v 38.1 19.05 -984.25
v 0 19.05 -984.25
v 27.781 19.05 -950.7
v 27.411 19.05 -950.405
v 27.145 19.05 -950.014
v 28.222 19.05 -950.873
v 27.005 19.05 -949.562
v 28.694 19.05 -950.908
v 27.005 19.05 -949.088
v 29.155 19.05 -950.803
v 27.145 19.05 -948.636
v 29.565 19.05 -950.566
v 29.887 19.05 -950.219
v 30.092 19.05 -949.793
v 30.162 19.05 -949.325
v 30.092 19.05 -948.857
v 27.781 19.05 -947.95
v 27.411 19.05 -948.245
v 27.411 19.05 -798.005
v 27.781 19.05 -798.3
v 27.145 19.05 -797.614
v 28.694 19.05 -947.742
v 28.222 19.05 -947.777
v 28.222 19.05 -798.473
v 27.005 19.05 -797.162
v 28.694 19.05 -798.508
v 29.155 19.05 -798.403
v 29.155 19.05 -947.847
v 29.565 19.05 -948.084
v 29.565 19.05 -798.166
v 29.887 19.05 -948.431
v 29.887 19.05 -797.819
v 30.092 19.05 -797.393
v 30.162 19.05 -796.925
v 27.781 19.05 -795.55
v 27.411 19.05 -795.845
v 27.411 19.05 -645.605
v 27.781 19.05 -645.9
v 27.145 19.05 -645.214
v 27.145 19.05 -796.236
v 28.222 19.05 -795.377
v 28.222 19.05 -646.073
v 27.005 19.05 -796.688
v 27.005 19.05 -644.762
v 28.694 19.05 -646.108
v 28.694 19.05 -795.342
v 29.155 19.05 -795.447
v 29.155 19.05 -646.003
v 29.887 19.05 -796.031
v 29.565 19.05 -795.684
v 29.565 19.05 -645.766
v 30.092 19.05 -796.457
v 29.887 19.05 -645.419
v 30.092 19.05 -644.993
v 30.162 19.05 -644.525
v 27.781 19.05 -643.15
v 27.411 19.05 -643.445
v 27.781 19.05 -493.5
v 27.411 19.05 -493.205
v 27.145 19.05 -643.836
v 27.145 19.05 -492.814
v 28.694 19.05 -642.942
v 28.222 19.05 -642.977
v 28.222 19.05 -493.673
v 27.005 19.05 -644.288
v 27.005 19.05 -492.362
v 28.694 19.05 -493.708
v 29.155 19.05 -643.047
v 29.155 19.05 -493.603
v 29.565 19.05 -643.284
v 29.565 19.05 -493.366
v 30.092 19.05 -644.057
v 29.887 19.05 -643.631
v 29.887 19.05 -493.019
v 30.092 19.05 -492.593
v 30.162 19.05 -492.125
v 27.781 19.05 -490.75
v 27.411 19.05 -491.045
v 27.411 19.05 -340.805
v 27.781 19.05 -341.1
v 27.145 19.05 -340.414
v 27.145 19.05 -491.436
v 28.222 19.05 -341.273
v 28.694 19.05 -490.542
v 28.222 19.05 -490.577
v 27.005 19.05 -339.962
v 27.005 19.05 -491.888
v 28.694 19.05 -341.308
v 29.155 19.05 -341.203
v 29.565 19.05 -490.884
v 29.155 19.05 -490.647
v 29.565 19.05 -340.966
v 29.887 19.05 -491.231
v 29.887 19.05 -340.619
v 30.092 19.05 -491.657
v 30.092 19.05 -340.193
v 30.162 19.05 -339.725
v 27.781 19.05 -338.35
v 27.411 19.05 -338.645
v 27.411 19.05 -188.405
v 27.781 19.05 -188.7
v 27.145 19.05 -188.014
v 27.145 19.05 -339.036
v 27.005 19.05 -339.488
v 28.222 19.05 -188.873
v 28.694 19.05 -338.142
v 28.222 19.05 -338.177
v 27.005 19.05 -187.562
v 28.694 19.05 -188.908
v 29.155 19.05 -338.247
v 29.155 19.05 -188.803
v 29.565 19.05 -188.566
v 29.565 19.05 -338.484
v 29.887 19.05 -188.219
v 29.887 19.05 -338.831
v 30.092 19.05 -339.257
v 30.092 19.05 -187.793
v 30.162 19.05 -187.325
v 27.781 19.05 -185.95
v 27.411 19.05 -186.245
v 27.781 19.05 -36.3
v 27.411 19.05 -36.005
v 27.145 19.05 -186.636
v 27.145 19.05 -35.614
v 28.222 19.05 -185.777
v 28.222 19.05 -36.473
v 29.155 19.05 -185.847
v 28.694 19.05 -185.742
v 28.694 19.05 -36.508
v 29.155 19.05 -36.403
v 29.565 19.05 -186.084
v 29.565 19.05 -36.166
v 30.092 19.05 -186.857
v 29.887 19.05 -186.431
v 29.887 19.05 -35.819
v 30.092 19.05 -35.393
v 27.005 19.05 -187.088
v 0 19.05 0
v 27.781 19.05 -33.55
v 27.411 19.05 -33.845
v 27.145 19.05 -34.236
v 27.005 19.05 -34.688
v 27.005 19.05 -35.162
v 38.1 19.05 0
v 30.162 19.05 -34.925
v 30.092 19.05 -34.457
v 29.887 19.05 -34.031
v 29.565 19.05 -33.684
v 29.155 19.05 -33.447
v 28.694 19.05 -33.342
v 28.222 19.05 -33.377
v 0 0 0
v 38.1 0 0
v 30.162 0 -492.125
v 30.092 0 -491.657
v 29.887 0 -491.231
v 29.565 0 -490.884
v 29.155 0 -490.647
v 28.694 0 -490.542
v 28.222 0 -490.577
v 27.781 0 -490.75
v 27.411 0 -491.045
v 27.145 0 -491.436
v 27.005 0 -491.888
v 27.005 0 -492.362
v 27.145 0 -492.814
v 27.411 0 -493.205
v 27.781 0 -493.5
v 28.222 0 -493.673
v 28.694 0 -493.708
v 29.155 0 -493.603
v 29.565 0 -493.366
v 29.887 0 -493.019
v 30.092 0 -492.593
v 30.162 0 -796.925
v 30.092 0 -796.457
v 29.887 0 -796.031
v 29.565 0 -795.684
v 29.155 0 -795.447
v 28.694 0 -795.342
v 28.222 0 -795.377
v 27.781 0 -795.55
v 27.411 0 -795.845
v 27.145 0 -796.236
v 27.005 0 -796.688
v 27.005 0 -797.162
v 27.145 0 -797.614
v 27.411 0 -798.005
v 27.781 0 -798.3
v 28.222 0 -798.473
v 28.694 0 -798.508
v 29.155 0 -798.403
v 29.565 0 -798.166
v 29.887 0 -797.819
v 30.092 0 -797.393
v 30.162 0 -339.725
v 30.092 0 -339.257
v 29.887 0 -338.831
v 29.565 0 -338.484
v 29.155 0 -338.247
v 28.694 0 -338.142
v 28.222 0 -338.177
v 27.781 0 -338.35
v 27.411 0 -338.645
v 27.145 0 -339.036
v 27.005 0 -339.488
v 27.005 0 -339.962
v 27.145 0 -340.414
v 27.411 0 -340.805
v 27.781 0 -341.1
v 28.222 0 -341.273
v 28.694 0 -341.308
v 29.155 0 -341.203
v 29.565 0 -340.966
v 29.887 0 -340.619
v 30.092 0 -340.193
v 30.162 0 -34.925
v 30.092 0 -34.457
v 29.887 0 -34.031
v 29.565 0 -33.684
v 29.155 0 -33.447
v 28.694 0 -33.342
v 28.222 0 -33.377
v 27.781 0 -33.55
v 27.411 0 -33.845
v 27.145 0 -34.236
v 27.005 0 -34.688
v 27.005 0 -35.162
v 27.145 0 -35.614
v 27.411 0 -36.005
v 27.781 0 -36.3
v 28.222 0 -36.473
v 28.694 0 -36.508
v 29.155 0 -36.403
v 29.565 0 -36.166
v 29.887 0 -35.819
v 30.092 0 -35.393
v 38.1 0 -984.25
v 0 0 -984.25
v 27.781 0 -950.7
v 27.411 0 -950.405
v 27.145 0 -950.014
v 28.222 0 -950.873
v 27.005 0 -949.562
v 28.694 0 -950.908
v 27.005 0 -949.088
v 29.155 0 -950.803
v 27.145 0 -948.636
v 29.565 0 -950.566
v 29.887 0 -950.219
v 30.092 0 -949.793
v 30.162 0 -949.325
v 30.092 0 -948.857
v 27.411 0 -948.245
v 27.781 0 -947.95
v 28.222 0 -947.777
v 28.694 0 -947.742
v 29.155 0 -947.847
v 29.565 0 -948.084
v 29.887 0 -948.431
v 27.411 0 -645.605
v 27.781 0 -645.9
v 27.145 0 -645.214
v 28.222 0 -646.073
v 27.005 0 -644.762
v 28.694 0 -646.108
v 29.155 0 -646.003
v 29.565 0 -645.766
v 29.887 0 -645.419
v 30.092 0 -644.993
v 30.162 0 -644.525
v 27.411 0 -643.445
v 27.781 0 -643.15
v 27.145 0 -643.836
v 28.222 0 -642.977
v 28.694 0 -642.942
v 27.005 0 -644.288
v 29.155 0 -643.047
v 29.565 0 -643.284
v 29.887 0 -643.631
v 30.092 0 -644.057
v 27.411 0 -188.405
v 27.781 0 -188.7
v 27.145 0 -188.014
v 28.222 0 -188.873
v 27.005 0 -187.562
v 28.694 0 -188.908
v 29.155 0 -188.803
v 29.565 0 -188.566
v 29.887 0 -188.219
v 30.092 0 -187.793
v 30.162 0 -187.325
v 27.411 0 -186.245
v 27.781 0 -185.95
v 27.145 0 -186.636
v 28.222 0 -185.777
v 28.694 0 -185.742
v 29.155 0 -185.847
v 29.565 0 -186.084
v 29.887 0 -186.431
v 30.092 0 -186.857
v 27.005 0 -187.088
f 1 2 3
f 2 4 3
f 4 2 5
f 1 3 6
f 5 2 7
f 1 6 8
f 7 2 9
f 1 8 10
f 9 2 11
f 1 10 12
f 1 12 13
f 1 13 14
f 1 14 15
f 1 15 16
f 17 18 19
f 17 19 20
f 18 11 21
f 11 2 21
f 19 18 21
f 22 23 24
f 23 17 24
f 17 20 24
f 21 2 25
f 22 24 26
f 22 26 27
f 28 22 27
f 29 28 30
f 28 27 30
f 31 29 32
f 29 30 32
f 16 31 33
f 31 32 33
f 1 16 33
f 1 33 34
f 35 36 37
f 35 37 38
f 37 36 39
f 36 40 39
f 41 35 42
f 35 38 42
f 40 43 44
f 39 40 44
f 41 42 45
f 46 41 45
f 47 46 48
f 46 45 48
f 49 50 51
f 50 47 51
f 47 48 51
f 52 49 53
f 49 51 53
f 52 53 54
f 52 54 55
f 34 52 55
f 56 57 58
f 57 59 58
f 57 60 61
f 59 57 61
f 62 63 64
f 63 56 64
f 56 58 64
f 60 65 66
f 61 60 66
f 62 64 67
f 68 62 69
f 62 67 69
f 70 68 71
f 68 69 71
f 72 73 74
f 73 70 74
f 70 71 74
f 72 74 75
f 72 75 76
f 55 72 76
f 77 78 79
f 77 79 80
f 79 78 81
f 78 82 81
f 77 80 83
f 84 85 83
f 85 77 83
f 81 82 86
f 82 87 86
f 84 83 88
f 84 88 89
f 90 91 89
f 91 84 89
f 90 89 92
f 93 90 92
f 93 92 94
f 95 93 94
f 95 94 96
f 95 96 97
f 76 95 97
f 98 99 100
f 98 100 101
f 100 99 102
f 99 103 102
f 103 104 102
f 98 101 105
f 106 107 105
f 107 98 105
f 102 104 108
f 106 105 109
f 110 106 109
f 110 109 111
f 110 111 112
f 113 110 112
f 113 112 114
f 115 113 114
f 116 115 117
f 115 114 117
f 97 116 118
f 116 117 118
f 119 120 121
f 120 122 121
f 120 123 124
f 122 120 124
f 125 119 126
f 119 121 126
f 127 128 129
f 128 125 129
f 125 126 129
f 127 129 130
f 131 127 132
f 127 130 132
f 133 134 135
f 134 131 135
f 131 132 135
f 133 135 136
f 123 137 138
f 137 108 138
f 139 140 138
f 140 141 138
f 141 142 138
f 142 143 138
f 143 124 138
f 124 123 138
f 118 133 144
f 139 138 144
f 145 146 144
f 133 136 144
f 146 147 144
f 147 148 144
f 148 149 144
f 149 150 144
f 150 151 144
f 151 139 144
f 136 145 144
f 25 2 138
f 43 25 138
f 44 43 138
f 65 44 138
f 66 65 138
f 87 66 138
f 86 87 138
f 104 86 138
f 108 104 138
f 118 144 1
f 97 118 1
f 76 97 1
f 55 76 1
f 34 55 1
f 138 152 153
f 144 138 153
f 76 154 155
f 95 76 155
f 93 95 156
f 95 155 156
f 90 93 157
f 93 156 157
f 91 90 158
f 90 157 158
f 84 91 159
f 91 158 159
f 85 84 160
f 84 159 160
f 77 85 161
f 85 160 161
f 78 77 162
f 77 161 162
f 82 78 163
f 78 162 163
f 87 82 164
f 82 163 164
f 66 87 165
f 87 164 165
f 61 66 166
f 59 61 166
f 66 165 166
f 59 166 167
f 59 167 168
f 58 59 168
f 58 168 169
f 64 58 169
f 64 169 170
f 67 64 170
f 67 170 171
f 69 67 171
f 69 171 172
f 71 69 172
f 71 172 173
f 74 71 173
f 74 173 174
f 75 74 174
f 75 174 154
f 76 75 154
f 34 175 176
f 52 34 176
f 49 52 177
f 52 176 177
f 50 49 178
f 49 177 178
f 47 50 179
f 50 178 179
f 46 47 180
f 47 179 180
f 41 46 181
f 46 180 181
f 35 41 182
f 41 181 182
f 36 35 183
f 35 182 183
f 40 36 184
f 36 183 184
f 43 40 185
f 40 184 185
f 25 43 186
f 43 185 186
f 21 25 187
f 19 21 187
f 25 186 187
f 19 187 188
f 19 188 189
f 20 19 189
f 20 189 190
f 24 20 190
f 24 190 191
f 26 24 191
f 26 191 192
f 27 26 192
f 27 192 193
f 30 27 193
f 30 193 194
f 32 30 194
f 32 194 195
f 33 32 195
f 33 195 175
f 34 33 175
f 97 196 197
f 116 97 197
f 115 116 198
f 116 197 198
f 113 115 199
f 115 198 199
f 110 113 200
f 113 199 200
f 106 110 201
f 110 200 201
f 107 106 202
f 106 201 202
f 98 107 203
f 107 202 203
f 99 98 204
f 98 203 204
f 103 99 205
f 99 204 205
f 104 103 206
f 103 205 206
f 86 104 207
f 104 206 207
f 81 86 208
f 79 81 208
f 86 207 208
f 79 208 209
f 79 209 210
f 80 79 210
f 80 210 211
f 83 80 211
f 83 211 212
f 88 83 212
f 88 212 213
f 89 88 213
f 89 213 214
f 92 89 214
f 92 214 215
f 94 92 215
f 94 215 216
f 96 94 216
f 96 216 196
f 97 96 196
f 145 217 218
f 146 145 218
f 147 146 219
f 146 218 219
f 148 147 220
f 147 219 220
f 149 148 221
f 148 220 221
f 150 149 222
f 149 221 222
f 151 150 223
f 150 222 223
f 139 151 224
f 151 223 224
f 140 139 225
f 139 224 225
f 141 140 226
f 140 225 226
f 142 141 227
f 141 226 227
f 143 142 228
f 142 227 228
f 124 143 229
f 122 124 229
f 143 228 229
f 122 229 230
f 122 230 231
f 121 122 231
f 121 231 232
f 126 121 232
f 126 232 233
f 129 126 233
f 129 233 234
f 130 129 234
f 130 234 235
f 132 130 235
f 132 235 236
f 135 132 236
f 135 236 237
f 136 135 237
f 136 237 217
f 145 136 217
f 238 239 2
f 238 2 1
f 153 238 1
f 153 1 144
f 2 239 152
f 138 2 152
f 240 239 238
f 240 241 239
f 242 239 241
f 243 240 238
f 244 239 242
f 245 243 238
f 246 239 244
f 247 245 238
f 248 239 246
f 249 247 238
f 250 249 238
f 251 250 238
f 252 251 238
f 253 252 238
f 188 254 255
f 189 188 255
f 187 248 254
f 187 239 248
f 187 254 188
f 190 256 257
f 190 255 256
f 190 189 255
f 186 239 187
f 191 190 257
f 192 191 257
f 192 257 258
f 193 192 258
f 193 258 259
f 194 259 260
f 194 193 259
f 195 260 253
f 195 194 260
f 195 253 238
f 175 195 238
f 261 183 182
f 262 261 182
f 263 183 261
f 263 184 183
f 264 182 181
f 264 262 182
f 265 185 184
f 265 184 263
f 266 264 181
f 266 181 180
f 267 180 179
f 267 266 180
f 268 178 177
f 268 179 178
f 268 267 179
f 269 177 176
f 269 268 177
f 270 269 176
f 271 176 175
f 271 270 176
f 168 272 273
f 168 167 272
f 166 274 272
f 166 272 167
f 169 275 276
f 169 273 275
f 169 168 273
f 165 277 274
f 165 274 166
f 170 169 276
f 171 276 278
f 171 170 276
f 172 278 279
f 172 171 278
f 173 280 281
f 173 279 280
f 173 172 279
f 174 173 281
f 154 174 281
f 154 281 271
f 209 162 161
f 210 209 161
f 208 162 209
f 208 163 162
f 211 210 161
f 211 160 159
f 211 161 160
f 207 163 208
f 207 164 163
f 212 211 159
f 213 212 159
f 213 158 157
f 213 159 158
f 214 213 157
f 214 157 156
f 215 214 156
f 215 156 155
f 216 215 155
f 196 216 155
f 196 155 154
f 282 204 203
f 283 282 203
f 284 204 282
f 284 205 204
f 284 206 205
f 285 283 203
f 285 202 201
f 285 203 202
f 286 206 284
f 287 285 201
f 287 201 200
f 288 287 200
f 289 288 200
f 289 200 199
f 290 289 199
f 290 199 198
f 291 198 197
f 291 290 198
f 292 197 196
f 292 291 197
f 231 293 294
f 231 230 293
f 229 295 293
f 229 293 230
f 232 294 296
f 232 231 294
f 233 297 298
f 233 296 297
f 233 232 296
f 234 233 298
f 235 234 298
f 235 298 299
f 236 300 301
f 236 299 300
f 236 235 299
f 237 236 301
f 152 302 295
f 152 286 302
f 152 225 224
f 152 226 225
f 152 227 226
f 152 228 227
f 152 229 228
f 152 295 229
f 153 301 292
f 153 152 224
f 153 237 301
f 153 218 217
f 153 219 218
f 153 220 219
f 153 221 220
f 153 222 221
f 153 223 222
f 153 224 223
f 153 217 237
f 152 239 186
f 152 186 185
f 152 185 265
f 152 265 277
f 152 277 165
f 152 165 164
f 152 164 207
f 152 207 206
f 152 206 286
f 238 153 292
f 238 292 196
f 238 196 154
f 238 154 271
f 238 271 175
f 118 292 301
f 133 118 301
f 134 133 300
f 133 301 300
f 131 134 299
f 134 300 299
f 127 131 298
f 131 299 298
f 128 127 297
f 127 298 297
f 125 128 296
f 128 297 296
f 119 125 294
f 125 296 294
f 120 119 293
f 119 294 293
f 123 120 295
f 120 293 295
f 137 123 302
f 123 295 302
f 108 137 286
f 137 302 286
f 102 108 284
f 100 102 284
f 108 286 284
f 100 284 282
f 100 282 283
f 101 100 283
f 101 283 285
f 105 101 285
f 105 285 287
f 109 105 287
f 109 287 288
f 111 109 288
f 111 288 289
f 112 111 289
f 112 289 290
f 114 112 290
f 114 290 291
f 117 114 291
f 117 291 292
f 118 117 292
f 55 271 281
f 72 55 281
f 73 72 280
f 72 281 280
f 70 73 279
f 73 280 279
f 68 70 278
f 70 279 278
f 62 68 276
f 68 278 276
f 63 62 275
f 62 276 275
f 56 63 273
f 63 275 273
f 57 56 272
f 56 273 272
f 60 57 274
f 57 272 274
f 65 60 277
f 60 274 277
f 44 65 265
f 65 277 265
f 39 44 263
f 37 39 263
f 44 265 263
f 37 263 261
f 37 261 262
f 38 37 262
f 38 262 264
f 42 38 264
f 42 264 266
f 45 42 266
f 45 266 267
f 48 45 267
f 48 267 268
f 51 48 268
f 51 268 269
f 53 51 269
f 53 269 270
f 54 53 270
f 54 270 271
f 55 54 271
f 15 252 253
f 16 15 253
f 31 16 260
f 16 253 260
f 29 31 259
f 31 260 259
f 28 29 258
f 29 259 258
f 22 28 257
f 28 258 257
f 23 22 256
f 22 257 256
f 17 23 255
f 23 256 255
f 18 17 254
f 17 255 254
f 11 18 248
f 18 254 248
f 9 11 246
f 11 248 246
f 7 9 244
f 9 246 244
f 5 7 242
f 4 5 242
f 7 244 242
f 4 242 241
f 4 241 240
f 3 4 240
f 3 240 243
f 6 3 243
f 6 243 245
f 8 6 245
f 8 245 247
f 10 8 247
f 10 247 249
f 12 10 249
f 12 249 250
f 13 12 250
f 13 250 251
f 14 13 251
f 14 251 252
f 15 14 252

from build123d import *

# Parameters (mm, degrees)
F0_W     = 38.1
F0_H     = 984.25
F1_DEPTH = 19.05
F2_R     = 1.5875
F3_DEPTH = 19.051


with BuildPart() as f1:
    # F0 (on Front) → F1 (new body)
    with BuildSketch(Plane.XZ):
        with Locations((19.05, -492.125)):
            Rectangle(F0_W, F0_H)
    extrude(amount=-F1_DEPTH)

    # F2 (on Front) → F3 (cut, through all)
    with BuildSketch(Plane.XZ):
        with Locations((28.575, -34.925)):
            Circle(F2_R)
        with Locations((28.575, -187.325)):
            Circle(F2_R)
        with Locations((28.575, -339.725)):
            Circle(F2_R)
        with Locations((28.575, -492.125)):
            Circle(F2_R)
        with Locations((28.575, -644.525)):
            Circle(F2_R)
        with Locations((28.575, -796.925)):
            Circle(F2_R)
        with Locations((28.575, -949.325)):
            Circle(F2_R)
    extrude(amount=-F3_DEPTH, mode=Mode.SUBTRACT)


solid = f1.part
